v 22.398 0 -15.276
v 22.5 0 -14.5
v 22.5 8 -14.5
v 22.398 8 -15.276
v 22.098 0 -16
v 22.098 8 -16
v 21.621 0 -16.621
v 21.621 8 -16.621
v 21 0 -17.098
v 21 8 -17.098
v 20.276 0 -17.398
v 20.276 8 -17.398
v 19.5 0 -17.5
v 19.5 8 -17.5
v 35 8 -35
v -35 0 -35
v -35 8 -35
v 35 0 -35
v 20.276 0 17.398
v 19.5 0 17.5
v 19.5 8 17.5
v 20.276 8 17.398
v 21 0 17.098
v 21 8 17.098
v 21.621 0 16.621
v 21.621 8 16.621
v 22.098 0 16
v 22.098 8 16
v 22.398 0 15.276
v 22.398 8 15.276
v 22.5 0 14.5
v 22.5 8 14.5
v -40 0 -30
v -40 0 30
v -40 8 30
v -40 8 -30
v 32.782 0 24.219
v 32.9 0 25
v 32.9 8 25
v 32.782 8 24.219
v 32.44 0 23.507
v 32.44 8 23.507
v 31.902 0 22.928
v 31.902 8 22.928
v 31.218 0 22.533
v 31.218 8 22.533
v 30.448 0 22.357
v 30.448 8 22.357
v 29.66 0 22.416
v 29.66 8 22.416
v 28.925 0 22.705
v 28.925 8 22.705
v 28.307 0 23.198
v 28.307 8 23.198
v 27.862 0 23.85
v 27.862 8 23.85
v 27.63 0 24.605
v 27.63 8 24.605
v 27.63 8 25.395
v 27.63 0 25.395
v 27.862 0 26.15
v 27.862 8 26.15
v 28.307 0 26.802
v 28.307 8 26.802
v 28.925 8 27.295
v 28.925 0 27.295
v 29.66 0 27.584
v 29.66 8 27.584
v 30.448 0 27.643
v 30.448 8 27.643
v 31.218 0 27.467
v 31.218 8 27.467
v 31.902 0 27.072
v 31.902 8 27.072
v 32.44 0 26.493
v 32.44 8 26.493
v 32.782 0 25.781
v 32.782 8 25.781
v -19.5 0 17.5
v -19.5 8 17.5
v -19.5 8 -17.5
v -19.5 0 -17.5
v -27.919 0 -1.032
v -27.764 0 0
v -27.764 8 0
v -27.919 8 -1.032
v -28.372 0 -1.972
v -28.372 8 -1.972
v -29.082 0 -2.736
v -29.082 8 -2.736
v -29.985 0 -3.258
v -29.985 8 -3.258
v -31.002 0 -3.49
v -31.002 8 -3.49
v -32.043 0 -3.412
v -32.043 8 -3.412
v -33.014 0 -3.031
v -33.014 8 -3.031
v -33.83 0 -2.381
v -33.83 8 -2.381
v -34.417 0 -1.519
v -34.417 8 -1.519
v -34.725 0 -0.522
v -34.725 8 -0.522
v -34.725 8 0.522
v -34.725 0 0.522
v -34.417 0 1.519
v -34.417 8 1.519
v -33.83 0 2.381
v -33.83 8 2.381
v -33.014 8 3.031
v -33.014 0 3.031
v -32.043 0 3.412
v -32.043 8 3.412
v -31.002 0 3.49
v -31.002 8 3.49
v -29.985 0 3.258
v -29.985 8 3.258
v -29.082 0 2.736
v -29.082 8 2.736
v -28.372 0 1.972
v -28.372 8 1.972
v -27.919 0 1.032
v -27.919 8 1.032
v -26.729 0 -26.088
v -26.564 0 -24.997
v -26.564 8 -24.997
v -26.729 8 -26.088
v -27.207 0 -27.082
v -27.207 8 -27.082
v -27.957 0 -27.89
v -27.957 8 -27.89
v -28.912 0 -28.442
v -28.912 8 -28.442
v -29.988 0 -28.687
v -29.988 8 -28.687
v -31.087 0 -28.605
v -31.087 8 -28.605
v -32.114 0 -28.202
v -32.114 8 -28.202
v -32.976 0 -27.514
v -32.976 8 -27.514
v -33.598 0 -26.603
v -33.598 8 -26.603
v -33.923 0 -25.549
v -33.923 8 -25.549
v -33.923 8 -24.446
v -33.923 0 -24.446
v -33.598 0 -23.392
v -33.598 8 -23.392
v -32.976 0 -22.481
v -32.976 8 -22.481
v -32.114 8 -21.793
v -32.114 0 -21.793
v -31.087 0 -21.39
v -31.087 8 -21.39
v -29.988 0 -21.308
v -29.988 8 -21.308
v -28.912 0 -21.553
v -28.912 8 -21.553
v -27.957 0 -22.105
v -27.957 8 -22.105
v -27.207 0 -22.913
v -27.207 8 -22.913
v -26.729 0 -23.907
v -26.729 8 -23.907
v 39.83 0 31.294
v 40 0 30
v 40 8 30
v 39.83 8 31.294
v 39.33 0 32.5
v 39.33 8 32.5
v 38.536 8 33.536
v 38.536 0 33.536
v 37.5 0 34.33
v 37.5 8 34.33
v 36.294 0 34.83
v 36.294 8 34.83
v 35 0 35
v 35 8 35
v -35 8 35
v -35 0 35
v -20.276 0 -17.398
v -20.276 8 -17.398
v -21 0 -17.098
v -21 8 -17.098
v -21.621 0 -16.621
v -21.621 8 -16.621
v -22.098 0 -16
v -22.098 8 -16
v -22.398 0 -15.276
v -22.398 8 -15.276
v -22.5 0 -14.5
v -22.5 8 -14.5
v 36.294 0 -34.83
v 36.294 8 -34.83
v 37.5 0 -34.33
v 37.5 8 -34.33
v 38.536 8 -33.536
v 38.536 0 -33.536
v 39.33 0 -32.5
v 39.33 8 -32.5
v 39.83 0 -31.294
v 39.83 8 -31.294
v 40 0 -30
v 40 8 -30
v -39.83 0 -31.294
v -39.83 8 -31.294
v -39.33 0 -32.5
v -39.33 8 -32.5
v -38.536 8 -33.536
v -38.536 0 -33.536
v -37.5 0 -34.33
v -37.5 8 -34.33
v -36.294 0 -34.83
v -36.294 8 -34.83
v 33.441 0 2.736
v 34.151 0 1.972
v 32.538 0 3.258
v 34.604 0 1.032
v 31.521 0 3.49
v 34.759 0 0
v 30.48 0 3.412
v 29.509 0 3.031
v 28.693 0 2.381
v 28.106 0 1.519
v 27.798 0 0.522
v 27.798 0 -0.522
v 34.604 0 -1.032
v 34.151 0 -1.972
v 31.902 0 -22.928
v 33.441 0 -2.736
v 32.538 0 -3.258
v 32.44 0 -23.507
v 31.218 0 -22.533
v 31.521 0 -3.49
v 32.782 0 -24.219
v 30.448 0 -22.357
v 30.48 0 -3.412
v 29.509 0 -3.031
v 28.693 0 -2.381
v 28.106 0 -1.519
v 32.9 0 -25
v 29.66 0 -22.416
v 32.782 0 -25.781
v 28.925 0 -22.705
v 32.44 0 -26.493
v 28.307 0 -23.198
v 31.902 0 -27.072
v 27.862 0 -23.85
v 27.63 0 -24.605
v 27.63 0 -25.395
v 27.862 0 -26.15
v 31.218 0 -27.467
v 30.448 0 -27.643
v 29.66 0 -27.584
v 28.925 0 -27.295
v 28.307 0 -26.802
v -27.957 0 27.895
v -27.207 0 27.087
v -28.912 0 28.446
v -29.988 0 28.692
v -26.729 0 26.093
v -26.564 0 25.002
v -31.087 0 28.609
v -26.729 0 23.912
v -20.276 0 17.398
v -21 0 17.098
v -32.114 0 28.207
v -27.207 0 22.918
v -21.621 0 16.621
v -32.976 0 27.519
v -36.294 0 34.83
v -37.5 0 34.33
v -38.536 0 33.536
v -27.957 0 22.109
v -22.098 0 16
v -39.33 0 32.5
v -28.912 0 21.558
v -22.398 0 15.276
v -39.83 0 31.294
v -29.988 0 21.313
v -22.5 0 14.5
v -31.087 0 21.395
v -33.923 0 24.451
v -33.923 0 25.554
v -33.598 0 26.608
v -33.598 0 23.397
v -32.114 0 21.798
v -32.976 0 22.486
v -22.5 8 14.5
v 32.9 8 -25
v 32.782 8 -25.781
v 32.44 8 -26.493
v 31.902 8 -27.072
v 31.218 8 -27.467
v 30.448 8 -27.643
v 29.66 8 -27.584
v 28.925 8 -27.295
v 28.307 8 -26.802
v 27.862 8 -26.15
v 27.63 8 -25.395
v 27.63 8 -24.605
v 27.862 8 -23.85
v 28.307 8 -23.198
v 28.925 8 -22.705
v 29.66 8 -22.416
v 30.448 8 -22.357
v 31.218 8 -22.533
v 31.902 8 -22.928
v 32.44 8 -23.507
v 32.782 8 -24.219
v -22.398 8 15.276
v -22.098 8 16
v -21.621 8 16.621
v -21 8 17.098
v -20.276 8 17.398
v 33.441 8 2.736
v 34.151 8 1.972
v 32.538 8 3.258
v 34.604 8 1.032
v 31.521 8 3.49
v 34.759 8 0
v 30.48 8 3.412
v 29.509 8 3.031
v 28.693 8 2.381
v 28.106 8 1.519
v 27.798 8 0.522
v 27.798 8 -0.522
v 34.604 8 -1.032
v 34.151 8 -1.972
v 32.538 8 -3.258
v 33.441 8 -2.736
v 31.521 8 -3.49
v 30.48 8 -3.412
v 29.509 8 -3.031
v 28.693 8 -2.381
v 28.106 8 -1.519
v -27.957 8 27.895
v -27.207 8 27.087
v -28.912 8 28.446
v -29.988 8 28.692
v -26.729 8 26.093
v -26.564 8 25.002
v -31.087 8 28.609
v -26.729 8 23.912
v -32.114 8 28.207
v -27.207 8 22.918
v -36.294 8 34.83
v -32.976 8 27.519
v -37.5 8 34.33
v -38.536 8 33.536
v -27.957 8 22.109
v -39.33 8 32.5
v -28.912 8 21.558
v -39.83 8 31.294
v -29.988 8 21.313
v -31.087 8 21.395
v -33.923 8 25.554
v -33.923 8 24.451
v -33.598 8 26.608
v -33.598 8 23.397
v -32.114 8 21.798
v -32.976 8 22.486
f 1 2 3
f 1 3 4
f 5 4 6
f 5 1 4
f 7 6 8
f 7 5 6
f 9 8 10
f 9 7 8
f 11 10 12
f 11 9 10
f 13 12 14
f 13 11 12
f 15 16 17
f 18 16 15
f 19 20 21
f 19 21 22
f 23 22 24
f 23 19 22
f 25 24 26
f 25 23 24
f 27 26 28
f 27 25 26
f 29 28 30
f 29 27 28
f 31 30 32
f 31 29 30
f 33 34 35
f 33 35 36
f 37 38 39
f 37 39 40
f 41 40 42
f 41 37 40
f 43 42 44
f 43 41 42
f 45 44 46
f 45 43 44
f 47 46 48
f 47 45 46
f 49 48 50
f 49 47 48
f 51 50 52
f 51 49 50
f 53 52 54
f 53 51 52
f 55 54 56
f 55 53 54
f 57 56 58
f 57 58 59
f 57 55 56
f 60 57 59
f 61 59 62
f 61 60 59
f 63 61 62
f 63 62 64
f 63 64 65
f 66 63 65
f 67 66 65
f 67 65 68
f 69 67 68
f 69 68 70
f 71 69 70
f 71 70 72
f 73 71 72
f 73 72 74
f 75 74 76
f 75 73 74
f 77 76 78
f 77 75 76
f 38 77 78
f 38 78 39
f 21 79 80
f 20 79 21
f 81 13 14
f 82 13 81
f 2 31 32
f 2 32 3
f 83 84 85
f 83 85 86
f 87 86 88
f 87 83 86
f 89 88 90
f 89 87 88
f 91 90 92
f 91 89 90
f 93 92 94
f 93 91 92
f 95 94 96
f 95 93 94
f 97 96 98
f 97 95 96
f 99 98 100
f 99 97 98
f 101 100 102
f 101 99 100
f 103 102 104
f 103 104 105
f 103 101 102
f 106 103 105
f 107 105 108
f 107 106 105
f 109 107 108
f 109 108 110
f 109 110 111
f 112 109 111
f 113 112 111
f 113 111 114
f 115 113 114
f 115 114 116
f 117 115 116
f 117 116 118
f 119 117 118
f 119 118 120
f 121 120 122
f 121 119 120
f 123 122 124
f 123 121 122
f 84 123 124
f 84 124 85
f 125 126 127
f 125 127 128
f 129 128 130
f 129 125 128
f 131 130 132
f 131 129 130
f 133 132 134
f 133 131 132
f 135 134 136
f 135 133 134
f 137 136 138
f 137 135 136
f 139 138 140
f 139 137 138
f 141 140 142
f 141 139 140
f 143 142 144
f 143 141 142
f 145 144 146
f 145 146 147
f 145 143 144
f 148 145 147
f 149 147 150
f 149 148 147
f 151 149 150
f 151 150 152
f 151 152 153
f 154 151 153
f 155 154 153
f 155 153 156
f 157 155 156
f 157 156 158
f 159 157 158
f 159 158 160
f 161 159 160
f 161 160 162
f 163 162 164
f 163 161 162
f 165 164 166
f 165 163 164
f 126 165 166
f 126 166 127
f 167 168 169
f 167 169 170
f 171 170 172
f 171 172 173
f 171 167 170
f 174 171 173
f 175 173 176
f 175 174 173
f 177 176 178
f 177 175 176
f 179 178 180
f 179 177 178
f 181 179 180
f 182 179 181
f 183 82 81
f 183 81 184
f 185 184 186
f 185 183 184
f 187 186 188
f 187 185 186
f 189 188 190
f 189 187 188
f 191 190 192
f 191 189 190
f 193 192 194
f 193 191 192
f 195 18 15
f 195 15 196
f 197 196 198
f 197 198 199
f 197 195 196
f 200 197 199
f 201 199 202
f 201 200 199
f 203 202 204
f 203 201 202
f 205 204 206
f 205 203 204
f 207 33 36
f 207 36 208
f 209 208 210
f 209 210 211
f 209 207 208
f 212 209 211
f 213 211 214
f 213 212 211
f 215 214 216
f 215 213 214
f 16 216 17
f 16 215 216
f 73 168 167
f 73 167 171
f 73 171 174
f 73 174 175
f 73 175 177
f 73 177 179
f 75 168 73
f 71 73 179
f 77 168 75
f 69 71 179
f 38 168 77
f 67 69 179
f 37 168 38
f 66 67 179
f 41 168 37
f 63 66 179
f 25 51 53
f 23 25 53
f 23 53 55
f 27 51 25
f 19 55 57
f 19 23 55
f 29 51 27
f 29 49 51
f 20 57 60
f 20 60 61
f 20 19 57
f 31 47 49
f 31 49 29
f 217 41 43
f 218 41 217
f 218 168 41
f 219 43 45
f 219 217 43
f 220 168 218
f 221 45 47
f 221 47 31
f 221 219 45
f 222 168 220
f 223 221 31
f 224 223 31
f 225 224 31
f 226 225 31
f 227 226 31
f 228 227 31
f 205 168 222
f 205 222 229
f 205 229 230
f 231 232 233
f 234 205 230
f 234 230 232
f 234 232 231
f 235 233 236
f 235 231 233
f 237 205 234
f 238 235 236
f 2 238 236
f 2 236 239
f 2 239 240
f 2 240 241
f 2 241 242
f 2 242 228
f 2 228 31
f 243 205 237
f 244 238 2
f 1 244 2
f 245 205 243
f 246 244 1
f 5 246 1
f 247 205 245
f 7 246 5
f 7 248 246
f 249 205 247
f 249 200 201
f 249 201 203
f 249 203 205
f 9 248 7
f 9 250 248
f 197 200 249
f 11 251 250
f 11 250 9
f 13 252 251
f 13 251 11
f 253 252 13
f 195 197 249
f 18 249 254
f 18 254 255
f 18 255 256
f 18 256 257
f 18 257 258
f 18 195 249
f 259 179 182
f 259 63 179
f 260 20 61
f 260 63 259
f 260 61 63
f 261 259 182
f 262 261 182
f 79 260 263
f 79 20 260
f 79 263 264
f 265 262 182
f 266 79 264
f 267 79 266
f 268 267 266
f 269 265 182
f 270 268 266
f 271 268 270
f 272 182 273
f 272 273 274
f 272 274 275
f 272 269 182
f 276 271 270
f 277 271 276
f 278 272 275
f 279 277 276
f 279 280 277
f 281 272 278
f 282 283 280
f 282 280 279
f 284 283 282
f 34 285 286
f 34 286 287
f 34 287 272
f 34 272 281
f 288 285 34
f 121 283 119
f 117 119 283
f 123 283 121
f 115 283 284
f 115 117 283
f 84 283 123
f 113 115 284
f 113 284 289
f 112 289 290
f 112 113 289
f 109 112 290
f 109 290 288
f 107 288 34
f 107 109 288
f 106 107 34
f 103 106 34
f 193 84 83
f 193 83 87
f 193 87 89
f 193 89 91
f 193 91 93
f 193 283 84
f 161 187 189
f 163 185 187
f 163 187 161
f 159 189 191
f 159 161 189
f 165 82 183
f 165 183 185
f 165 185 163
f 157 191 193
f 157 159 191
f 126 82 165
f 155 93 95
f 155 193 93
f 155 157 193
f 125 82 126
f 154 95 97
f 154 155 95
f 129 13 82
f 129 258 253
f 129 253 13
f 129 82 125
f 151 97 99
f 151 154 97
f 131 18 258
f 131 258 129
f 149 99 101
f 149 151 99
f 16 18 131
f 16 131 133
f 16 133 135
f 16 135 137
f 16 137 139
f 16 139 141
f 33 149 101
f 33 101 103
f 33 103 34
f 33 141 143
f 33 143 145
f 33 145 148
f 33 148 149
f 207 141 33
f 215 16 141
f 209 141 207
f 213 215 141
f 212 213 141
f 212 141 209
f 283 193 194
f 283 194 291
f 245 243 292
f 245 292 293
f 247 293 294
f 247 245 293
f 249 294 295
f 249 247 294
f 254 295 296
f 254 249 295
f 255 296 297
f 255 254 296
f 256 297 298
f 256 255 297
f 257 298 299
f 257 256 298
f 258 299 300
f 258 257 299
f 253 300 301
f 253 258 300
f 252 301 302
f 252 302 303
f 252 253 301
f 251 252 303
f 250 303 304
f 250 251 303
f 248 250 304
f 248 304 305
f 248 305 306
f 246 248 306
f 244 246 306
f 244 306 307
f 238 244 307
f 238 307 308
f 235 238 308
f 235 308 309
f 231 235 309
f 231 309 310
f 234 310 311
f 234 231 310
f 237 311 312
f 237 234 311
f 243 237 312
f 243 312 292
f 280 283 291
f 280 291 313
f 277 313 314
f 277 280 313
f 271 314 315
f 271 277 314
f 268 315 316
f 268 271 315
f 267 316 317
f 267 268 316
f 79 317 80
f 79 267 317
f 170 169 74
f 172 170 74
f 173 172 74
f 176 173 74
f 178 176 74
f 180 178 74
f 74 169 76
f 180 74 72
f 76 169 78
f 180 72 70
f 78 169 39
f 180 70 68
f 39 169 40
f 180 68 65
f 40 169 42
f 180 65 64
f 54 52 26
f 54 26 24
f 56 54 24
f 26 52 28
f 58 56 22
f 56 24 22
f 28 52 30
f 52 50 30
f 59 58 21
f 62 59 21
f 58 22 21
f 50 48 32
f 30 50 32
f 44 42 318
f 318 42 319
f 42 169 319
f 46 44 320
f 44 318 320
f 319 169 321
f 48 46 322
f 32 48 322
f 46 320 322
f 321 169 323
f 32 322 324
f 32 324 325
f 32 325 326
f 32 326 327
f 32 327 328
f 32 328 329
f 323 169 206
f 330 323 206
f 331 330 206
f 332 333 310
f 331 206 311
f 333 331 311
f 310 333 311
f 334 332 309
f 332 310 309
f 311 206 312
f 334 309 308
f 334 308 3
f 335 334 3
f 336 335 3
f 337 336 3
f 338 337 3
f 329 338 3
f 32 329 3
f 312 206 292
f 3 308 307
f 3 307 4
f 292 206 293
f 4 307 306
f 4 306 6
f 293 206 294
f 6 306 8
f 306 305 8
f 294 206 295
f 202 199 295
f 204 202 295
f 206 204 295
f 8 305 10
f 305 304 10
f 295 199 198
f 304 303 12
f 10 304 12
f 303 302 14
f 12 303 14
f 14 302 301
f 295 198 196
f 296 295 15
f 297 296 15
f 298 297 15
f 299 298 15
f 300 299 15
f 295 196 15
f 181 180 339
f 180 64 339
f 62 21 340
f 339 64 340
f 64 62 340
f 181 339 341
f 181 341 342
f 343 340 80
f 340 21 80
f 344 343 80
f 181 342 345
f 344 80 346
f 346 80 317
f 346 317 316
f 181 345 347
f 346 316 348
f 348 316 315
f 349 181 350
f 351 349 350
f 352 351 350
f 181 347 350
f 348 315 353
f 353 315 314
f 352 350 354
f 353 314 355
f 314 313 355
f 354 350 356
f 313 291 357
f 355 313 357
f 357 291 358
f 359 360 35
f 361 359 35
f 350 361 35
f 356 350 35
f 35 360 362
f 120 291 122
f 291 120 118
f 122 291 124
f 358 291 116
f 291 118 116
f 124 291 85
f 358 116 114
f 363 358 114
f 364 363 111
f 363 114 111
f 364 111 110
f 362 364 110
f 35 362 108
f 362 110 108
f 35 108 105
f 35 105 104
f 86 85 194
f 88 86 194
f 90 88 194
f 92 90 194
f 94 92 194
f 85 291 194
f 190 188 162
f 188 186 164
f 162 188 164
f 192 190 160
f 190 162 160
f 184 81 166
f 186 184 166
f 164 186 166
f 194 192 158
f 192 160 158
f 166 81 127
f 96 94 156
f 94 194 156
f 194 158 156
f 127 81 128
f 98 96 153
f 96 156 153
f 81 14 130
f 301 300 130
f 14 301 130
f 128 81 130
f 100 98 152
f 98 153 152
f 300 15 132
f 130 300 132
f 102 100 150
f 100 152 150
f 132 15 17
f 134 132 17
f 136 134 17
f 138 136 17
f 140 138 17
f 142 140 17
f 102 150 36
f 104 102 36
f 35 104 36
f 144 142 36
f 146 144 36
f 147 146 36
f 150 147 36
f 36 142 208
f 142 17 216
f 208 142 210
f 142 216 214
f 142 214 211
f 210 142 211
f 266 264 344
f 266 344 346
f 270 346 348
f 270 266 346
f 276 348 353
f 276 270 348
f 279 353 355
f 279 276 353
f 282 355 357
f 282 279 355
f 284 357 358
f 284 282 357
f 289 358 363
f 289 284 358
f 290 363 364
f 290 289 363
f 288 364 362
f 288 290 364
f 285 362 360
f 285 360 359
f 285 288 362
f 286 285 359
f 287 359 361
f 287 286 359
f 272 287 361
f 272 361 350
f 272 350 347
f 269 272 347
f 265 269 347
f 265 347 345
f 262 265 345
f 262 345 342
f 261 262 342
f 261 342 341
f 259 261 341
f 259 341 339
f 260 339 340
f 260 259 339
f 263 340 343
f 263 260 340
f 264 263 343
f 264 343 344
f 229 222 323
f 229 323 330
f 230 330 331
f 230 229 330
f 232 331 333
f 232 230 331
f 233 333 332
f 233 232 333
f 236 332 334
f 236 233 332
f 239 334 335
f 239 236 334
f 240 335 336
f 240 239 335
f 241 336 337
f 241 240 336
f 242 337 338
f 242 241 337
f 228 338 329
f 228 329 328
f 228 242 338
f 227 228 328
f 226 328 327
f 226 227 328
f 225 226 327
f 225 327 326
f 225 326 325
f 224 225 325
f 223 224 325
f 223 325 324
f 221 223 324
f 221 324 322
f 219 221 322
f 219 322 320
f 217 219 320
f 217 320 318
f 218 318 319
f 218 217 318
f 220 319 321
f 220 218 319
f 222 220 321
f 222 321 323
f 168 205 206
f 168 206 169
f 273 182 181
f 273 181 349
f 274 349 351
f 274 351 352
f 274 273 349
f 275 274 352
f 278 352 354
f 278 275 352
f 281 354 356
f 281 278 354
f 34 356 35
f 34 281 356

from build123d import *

# Parameters (mm, degrees)
CROQUIS1_R              = 3.5
CROQUIS1_R_2            = 2.65
CROQUIS1_R_3            = 3.7
SALIENTE_EXTRUIR2_DEPTH = 8


with BuildPart() as part:
    # Croquis1 → Saliente-Extruir2 (new body)
    with BuildSketch(Plane(origin=(0, 0, 0), x_dir=(1, 0, 0), z_dir=(0, 1, 0))):
        with BuildLine():
            ThreePointArc((40, -30), (38.535533906, -33.535533906), (35, -35))
            Line((35, -35), (-35, -35))
            ThreePointArc((-35, -35), (-38.535533906, -33.535533906), (-40, -30))
            Line((-40, -30), (-40, 30))
            ThreePointArc((-40, 30), (-38.535533906, 33.535533906), (-35, 35))
            Line((-35, 35), (35, 35))
            ThreePointArc((35, 35), (38.535533906, 33.535533906), (40, 30))
            Line((40, 30), (40, -30))
        make_face()
        with Locations((31.259169622, 0)):
            Circle(CROQUIS1_R, mode=Mode.SUBTRACT)
        with Locations((30.25001, 25)):
            Circle(CROQUIS1_R_2, mode=Mode.SUBTRACT)
        with Locations((30.25001, -25)):
            Circle(CROQUIS1_R_2, mode=Mode.SUBTRACT)
        with Locations((-31.263846279, 0)):
            Circle(CROQUIS1_R, mode=Mode.SUBTRACT)
        with Locations((-30.264120004, 24.99741)):
            Circle(CROQUIS1_R_3, mode=Mode.SUBTRACT)
        with Locations((-30.264120004, -25.00224)):
            Circle(CROQUIS1_R_3, mode=Mode.SUBTRACT)
        with BuildLine():
            ThreePointArc((19.5, -17.5), (21.621320344, -16.621320344), (22.5, -14.5))
            Line((22.5, -14.5), (22.5, 14.5))
            ThreePointArc((22.5, 14.5), (21.621320344, 16.621320344), (19.5, 17.5))
            Line((19.5, 17.5), (-19.5, 17.5))
            ThreePointArc((-19.5, 17.5), (-21.621320344, 16.621320344), (-22.5, 14.5))
            Line((-22.5, 14.5), (-22.5, -14.5))
            ThreePointArc((-22.5, -14.5), (-21.621320344, -16.621320344), (-19.5, -17.5))
            Line((-19.5, -17.5), (19.5, -17.5))
        make_face(mode=Mode.SUBTRACT)
    extrude(amount=SALIENTE_EXTRUIR2_DEPTH)


solid = part.part
